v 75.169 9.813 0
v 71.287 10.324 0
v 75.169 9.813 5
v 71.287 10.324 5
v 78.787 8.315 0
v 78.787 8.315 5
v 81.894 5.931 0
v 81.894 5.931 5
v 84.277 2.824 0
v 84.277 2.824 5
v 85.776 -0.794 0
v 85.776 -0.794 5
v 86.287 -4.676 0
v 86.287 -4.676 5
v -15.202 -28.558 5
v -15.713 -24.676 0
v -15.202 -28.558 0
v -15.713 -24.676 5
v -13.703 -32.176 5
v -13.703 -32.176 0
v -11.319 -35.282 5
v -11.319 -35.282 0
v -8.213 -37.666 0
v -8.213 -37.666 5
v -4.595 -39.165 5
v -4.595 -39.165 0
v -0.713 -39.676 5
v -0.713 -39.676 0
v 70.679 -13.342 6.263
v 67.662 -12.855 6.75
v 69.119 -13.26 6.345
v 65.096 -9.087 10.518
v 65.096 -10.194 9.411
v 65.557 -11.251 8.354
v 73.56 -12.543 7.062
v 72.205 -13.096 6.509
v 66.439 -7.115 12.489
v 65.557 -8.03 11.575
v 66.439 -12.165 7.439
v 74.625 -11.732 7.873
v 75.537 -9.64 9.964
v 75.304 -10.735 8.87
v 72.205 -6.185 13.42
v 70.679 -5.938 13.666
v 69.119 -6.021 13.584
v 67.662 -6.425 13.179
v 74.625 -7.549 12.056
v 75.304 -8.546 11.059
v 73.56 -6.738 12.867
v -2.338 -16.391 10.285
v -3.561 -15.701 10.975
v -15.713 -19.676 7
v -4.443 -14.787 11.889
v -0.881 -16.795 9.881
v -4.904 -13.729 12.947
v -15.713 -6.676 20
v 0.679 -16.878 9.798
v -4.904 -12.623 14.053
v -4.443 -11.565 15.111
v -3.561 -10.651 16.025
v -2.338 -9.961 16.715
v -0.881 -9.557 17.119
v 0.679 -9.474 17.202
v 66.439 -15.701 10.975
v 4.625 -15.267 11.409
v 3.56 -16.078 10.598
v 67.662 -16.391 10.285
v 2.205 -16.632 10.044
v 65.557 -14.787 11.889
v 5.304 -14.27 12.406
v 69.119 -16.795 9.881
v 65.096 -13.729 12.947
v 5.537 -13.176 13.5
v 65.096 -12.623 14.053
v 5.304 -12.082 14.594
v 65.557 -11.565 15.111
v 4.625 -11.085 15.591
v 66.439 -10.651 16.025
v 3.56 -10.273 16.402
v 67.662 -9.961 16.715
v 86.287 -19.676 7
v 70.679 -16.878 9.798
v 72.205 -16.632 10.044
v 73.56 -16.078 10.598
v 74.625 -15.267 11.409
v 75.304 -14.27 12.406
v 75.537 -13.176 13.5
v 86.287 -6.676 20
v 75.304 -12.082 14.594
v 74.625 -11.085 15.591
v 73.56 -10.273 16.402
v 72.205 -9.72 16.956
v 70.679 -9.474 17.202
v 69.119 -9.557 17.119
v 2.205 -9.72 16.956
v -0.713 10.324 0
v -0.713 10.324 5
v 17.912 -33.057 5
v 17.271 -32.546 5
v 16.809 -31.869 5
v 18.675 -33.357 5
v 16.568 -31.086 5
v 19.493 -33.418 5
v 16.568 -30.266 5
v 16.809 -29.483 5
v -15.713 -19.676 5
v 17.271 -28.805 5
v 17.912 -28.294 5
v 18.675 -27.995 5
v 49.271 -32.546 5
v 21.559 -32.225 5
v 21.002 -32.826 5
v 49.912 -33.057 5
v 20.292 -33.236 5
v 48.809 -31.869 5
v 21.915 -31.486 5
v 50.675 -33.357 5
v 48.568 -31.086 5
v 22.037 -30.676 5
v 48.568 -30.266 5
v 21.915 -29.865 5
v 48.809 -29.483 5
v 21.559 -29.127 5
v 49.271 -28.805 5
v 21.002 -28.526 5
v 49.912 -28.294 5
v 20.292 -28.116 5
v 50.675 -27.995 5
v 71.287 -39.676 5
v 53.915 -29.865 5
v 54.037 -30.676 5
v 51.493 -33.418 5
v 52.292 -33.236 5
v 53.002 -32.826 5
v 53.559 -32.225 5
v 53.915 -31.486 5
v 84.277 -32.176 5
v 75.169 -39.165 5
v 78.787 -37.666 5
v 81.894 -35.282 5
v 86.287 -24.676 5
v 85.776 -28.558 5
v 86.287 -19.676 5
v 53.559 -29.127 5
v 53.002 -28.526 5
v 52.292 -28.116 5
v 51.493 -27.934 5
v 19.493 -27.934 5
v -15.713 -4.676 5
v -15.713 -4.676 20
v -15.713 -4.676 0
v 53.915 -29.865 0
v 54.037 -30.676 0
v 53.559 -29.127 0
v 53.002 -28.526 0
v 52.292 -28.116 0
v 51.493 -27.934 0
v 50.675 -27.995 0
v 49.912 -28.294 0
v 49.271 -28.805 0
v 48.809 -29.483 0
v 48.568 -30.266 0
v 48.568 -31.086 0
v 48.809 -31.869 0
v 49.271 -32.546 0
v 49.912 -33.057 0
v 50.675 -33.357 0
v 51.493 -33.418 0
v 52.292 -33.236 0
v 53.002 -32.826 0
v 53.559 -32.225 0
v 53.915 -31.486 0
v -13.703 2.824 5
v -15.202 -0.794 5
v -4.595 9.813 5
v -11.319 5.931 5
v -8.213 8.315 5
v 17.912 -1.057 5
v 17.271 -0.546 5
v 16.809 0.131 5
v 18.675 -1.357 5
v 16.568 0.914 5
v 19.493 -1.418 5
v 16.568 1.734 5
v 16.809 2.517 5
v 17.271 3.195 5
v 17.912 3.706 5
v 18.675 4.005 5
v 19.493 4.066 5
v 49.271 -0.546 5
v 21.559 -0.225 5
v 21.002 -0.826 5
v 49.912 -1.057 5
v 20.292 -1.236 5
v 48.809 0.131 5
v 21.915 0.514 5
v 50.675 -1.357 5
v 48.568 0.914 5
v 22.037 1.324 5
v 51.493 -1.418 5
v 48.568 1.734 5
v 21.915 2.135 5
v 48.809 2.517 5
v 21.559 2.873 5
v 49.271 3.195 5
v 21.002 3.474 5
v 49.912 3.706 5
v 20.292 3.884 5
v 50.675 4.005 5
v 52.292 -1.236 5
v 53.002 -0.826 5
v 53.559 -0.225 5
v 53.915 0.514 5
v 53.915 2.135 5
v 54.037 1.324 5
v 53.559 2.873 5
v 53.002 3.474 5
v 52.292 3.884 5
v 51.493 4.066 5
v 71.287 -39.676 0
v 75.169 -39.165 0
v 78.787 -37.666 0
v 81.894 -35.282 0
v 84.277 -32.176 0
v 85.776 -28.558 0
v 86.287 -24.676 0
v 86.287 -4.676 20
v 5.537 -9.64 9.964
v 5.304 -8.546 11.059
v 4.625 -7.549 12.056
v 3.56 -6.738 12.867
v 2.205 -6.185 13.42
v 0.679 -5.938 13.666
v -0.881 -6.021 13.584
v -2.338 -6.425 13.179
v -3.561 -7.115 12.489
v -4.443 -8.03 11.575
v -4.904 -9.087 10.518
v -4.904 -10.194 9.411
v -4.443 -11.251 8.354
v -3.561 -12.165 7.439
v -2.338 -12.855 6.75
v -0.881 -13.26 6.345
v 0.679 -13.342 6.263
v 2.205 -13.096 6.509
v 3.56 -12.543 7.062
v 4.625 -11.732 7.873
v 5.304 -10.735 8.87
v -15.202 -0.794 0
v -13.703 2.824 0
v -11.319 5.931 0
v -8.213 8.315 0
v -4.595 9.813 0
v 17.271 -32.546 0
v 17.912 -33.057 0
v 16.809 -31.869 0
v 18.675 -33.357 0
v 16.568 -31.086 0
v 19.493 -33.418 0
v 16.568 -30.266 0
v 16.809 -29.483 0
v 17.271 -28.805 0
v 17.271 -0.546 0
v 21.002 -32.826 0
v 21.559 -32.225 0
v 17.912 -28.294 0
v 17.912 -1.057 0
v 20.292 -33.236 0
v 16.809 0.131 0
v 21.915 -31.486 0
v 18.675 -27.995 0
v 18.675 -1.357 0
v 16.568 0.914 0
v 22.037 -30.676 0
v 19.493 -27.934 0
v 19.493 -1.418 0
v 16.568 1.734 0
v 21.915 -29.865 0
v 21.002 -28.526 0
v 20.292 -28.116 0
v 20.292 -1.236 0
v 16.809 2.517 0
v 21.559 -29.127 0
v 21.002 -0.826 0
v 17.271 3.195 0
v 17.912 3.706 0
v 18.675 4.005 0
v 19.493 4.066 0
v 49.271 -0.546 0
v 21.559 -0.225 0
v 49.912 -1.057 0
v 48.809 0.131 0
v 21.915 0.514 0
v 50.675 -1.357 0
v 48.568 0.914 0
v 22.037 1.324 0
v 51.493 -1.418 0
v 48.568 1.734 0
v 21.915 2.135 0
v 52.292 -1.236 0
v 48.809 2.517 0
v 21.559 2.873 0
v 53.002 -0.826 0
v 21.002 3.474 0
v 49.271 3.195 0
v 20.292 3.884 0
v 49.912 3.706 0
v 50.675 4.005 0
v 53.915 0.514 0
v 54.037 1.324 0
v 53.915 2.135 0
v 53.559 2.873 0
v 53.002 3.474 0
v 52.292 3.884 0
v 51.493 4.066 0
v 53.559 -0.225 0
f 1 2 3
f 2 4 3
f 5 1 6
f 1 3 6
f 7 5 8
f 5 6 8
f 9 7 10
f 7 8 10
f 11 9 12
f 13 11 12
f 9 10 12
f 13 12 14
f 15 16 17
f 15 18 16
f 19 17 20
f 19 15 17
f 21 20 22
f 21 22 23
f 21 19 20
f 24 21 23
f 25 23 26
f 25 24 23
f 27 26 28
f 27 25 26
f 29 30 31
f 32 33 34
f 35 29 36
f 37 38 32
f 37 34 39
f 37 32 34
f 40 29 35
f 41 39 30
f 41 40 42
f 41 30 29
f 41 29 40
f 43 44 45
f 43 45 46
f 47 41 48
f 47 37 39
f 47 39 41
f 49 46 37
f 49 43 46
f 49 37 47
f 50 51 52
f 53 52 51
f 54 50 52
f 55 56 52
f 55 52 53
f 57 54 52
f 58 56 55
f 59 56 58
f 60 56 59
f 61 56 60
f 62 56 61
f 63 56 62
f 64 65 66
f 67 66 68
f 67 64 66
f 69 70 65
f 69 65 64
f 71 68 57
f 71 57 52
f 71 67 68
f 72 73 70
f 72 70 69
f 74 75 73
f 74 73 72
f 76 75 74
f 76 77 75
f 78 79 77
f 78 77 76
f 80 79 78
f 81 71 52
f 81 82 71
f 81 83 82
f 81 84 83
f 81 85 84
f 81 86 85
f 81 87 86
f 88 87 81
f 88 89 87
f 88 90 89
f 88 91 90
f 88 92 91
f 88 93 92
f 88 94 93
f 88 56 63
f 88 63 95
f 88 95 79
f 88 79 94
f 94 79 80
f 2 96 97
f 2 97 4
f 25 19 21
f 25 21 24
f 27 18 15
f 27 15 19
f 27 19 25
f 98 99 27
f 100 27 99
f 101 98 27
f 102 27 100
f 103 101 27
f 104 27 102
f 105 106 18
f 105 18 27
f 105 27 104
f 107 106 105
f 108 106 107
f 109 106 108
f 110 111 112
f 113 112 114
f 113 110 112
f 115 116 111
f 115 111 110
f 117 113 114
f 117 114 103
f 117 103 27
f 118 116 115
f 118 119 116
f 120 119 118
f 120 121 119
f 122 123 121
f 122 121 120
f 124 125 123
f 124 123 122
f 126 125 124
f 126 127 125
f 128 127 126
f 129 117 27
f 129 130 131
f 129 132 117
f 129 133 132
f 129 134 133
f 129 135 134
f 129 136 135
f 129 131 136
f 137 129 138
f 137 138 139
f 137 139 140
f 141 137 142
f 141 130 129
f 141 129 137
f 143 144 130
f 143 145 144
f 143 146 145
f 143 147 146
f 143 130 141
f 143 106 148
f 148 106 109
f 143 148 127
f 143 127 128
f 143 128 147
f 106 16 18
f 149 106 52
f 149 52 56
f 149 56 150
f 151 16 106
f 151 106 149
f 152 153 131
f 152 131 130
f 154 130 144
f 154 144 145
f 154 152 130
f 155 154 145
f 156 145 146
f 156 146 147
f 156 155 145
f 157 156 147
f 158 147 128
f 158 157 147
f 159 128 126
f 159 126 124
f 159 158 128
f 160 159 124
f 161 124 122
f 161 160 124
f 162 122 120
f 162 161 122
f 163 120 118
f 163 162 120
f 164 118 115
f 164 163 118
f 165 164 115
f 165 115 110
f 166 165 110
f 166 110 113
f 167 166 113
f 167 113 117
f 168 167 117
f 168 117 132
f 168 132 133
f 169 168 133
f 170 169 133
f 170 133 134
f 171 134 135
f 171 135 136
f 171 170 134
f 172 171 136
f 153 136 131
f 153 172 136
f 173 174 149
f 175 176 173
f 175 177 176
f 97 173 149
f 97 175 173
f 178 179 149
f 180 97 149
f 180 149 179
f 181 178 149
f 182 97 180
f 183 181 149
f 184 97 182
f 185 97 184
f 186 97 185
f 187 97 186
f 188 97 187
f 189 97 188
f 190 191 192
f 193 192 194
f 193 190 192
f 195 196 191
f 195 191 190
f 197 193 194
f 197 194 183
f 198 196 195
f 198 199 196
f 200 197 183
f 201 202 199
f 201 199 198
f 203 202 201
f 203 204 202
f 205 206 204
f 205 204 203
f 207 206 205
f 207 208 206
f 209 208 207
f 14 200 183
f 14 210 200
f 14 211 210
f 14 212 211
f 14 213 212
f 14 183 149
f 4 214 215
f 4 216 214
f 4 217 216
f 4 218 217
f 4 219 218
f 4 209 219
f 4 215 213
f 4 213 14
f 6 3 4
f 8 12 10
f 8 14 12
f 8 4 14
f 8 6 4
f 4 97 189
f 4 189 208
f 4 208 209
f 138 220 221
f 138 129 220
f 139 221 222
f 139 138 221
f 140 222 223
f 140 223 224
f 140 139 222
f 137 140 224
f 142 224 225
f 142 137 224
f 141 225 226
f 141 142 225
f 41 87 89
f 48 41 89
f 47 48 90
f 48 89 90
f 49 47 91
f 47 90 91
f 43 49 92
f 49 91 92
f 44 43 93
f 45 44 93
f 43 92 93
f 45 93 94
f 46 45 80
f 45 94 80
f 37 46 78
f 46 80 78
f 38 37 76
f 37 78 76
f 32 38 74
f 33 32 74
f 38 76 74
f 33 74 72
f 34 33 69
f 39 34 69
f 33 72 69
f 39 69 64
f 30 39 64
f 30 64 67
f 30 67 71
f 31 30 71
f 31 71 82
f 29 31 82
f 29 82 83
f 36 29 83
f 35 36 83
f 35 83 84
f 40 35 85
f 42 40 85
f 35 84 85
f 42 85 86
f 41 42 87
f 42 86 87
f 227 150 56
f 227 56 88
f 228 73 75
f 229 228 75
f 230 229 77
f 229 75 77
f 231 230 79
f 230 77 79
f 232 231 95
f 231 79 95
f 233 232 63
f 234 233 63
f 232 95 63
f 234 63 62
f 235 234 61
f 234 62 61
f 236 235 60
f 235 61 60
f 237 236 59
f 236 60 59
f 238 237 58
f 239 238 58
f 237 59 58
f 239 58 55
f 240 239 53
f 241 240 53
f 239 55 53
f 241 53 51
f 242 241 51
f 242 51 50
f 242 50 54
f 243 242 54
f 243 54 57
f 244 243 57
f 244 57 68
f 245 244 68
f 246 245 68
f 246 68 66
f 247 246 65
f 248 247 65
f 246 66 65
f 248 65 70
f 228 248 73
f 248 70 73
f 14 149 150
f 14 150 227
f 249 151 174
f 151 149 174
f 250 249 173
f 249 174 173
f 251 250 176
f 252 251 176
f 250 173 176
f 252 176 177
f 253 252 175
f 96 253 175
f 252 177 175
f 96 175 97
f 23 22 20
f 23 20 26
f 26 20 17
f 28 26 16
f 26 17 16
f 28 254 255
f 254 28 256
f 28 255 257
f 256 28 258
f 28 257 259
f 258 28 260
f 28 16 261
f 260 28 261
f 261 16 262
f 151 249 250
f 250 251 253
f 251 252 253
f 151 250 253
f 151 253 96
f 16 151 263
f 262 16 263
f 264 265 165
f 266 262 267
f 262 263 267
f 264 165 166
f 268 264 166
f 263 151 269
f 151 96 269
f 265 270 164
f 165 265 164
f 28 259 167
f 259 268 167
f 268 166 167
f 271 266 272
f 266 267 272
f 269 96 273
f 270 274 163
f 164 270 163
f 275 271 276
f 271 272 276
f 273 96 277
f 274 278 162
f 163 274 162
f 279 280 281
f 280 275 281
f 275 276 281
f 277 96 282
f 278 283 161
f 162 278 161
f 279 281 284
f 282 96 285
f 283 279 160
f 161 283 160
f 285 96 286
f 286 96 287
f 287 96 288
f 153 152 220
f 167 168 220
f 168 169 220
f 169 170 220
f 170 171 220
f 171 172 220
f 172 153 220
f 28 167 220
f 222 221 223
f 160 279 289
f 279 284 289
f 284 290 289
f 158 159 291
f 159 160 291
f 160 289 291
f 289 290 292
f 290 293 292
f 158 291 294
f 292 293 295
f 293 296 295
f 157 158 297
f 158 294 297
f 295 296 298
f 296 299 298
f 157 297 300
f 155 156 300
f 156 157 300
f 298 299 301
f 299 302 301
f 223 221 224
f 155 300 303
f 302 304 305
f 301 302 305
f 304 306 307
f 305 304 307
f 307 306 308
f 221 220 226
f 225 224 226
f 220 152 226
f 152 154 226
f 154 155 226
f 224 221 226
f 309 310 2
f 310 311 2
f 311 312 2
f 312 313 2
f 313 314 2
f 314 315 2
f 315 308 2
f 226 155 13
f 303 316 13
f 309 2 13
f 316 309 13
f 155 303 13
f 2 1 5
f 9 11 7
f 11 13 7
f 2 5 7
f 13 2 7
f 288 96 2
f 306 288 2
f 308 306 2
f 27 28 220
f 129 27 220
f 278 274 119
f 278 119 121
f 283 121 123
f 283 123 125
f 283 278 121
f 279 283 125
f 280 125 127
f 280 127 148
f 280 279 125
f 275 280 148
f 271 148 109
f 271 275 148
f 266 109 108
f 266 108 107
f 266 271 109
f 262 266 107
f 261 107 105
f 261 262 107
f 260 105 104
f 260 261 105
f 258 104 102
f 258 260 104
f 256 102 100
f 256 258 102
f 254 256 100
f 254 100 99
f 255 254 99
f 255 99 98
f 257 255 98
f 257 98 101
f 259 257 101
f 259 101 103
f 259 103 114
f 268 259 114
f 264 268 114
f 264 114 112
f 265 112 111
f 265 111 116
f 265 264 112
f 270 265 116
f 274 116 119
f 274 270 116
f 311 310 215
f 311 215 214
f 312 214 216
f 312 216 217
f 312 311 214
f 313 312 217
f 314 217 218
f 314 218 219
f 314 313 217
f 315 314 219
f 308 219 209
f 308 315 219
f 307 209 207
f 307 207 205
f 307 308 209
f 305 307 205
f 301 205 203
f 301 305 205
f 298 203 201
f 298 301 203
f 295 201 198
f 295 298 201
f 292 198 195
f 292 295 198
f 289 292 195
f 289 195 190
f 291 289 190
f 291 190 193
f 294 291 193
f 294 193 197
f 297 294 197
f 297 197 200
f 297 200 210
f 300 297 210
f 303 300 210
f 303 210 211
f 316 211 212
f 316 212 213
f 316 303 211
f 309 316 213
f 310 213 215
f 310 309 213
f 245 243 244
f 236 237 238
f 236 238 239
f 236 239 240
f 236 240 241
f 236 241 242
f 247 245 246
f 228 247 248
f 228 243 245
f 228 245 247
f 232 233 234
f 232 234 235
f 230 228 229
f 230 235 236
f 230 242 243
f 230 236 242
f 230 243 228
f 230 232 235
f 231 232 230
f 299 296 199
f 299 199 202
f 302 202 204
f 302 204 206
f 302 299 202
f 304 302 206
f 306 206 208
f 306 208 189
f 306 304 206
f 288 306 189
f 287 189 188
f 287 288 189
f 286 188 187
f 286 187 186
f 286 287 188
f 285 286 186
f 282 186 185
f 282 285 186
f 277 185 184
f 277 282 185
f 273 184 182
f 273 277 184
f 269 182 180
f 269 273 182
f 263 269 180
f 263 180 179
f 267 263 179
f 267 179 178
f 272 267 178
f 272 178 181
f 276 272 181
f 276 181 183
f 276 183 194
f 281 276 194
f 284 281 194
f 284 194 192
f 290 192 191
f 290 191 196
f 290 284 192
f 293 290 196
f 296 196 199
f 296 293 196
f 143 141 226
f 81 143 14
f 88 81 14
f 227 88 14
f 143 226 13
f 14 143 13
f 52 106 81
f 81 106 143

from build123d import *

# Parameters (mm, degrees)
F0_W     = 102
F0_H     = 50
F0_R     = 2.75
F1_DEPTH = 5
F2_W     = 102
F2_H     = 15
F3_DEPTH = 15
F4_SIZE  = 13
F5_R     = 15
F6_R     = 5.25
F7_DEPTH = 5


with BuildPart() as f1:
    # F0 (on Top) → F1 (new body)
    with BuildSketch(Plane.XY):
        with Locations((35.2871024236, -14.6758168936)):
            Rectangle(F0_W, F0_H)
        with Locations((19.2871024236, -30.6758168936)):
            Circle(F0_R, mode=Mode.SUBTRACT)
        with Locations((51.2871024236, -30.6758168936)):
            Circle(F0_R, mode=Mode.SUBTRACT)
        with Locations((19.2871024236, 1.3241831064)):
            Circle(F0_R, mode=Mode.SUBTRACT)
        with Locations((51.2871024236, 1.3241831064)):
            Circle(F0_R, mode=Mode.SUBTRACT)
    extrude(amount=F1_DEPTH)

    # F2 (on face) → F3 (join)
    with BuildSketch(Plane.XY.offset(5)):
        with Locations((35.2871024236, -12.1758168936)):
            Rectangle(F2_W, F2_H)
    extrude(amount=F3_DEPTH)

    # F4
    f4_edges = [f1.edges().sort_by_distance(p)[0] for p in [
        (35.287102, -19.675817, 20),
    ]]
    chamfer(f4_edges, length=F4_SIZE)

    # F5
    f5_edges = [f1.edges().sort_by_distance(p)[0] for p in [
        (86.287102, 10.324183, 2.5),
        (-15.712898, 10.324183, 2.5),
        (86.287102, -39.675817, 2.5),
        (-15.712898, -39.675817, 2.5),
    ]]
    fillet(f5_edges, radius=F5_R)

    # F6 (on face) → F7 (cut)
    with BuildSketch(Plane(origin=(0, -13.3379084468, 13.3379084468), x_dir=(1, 0, 0), z_dir=(0, -0.7071067812, 0.7071067812))):
        with Locations((0.2871024236, 0.2292320729)):
            Circle(F6_R)
        with Locations((70.2871024236, 0.2292320729)):
            Circle(F6_R)
    extrude(amount=-F7_DEPTH, mode=Mode.SUBTRACT)


solid = f1.part
